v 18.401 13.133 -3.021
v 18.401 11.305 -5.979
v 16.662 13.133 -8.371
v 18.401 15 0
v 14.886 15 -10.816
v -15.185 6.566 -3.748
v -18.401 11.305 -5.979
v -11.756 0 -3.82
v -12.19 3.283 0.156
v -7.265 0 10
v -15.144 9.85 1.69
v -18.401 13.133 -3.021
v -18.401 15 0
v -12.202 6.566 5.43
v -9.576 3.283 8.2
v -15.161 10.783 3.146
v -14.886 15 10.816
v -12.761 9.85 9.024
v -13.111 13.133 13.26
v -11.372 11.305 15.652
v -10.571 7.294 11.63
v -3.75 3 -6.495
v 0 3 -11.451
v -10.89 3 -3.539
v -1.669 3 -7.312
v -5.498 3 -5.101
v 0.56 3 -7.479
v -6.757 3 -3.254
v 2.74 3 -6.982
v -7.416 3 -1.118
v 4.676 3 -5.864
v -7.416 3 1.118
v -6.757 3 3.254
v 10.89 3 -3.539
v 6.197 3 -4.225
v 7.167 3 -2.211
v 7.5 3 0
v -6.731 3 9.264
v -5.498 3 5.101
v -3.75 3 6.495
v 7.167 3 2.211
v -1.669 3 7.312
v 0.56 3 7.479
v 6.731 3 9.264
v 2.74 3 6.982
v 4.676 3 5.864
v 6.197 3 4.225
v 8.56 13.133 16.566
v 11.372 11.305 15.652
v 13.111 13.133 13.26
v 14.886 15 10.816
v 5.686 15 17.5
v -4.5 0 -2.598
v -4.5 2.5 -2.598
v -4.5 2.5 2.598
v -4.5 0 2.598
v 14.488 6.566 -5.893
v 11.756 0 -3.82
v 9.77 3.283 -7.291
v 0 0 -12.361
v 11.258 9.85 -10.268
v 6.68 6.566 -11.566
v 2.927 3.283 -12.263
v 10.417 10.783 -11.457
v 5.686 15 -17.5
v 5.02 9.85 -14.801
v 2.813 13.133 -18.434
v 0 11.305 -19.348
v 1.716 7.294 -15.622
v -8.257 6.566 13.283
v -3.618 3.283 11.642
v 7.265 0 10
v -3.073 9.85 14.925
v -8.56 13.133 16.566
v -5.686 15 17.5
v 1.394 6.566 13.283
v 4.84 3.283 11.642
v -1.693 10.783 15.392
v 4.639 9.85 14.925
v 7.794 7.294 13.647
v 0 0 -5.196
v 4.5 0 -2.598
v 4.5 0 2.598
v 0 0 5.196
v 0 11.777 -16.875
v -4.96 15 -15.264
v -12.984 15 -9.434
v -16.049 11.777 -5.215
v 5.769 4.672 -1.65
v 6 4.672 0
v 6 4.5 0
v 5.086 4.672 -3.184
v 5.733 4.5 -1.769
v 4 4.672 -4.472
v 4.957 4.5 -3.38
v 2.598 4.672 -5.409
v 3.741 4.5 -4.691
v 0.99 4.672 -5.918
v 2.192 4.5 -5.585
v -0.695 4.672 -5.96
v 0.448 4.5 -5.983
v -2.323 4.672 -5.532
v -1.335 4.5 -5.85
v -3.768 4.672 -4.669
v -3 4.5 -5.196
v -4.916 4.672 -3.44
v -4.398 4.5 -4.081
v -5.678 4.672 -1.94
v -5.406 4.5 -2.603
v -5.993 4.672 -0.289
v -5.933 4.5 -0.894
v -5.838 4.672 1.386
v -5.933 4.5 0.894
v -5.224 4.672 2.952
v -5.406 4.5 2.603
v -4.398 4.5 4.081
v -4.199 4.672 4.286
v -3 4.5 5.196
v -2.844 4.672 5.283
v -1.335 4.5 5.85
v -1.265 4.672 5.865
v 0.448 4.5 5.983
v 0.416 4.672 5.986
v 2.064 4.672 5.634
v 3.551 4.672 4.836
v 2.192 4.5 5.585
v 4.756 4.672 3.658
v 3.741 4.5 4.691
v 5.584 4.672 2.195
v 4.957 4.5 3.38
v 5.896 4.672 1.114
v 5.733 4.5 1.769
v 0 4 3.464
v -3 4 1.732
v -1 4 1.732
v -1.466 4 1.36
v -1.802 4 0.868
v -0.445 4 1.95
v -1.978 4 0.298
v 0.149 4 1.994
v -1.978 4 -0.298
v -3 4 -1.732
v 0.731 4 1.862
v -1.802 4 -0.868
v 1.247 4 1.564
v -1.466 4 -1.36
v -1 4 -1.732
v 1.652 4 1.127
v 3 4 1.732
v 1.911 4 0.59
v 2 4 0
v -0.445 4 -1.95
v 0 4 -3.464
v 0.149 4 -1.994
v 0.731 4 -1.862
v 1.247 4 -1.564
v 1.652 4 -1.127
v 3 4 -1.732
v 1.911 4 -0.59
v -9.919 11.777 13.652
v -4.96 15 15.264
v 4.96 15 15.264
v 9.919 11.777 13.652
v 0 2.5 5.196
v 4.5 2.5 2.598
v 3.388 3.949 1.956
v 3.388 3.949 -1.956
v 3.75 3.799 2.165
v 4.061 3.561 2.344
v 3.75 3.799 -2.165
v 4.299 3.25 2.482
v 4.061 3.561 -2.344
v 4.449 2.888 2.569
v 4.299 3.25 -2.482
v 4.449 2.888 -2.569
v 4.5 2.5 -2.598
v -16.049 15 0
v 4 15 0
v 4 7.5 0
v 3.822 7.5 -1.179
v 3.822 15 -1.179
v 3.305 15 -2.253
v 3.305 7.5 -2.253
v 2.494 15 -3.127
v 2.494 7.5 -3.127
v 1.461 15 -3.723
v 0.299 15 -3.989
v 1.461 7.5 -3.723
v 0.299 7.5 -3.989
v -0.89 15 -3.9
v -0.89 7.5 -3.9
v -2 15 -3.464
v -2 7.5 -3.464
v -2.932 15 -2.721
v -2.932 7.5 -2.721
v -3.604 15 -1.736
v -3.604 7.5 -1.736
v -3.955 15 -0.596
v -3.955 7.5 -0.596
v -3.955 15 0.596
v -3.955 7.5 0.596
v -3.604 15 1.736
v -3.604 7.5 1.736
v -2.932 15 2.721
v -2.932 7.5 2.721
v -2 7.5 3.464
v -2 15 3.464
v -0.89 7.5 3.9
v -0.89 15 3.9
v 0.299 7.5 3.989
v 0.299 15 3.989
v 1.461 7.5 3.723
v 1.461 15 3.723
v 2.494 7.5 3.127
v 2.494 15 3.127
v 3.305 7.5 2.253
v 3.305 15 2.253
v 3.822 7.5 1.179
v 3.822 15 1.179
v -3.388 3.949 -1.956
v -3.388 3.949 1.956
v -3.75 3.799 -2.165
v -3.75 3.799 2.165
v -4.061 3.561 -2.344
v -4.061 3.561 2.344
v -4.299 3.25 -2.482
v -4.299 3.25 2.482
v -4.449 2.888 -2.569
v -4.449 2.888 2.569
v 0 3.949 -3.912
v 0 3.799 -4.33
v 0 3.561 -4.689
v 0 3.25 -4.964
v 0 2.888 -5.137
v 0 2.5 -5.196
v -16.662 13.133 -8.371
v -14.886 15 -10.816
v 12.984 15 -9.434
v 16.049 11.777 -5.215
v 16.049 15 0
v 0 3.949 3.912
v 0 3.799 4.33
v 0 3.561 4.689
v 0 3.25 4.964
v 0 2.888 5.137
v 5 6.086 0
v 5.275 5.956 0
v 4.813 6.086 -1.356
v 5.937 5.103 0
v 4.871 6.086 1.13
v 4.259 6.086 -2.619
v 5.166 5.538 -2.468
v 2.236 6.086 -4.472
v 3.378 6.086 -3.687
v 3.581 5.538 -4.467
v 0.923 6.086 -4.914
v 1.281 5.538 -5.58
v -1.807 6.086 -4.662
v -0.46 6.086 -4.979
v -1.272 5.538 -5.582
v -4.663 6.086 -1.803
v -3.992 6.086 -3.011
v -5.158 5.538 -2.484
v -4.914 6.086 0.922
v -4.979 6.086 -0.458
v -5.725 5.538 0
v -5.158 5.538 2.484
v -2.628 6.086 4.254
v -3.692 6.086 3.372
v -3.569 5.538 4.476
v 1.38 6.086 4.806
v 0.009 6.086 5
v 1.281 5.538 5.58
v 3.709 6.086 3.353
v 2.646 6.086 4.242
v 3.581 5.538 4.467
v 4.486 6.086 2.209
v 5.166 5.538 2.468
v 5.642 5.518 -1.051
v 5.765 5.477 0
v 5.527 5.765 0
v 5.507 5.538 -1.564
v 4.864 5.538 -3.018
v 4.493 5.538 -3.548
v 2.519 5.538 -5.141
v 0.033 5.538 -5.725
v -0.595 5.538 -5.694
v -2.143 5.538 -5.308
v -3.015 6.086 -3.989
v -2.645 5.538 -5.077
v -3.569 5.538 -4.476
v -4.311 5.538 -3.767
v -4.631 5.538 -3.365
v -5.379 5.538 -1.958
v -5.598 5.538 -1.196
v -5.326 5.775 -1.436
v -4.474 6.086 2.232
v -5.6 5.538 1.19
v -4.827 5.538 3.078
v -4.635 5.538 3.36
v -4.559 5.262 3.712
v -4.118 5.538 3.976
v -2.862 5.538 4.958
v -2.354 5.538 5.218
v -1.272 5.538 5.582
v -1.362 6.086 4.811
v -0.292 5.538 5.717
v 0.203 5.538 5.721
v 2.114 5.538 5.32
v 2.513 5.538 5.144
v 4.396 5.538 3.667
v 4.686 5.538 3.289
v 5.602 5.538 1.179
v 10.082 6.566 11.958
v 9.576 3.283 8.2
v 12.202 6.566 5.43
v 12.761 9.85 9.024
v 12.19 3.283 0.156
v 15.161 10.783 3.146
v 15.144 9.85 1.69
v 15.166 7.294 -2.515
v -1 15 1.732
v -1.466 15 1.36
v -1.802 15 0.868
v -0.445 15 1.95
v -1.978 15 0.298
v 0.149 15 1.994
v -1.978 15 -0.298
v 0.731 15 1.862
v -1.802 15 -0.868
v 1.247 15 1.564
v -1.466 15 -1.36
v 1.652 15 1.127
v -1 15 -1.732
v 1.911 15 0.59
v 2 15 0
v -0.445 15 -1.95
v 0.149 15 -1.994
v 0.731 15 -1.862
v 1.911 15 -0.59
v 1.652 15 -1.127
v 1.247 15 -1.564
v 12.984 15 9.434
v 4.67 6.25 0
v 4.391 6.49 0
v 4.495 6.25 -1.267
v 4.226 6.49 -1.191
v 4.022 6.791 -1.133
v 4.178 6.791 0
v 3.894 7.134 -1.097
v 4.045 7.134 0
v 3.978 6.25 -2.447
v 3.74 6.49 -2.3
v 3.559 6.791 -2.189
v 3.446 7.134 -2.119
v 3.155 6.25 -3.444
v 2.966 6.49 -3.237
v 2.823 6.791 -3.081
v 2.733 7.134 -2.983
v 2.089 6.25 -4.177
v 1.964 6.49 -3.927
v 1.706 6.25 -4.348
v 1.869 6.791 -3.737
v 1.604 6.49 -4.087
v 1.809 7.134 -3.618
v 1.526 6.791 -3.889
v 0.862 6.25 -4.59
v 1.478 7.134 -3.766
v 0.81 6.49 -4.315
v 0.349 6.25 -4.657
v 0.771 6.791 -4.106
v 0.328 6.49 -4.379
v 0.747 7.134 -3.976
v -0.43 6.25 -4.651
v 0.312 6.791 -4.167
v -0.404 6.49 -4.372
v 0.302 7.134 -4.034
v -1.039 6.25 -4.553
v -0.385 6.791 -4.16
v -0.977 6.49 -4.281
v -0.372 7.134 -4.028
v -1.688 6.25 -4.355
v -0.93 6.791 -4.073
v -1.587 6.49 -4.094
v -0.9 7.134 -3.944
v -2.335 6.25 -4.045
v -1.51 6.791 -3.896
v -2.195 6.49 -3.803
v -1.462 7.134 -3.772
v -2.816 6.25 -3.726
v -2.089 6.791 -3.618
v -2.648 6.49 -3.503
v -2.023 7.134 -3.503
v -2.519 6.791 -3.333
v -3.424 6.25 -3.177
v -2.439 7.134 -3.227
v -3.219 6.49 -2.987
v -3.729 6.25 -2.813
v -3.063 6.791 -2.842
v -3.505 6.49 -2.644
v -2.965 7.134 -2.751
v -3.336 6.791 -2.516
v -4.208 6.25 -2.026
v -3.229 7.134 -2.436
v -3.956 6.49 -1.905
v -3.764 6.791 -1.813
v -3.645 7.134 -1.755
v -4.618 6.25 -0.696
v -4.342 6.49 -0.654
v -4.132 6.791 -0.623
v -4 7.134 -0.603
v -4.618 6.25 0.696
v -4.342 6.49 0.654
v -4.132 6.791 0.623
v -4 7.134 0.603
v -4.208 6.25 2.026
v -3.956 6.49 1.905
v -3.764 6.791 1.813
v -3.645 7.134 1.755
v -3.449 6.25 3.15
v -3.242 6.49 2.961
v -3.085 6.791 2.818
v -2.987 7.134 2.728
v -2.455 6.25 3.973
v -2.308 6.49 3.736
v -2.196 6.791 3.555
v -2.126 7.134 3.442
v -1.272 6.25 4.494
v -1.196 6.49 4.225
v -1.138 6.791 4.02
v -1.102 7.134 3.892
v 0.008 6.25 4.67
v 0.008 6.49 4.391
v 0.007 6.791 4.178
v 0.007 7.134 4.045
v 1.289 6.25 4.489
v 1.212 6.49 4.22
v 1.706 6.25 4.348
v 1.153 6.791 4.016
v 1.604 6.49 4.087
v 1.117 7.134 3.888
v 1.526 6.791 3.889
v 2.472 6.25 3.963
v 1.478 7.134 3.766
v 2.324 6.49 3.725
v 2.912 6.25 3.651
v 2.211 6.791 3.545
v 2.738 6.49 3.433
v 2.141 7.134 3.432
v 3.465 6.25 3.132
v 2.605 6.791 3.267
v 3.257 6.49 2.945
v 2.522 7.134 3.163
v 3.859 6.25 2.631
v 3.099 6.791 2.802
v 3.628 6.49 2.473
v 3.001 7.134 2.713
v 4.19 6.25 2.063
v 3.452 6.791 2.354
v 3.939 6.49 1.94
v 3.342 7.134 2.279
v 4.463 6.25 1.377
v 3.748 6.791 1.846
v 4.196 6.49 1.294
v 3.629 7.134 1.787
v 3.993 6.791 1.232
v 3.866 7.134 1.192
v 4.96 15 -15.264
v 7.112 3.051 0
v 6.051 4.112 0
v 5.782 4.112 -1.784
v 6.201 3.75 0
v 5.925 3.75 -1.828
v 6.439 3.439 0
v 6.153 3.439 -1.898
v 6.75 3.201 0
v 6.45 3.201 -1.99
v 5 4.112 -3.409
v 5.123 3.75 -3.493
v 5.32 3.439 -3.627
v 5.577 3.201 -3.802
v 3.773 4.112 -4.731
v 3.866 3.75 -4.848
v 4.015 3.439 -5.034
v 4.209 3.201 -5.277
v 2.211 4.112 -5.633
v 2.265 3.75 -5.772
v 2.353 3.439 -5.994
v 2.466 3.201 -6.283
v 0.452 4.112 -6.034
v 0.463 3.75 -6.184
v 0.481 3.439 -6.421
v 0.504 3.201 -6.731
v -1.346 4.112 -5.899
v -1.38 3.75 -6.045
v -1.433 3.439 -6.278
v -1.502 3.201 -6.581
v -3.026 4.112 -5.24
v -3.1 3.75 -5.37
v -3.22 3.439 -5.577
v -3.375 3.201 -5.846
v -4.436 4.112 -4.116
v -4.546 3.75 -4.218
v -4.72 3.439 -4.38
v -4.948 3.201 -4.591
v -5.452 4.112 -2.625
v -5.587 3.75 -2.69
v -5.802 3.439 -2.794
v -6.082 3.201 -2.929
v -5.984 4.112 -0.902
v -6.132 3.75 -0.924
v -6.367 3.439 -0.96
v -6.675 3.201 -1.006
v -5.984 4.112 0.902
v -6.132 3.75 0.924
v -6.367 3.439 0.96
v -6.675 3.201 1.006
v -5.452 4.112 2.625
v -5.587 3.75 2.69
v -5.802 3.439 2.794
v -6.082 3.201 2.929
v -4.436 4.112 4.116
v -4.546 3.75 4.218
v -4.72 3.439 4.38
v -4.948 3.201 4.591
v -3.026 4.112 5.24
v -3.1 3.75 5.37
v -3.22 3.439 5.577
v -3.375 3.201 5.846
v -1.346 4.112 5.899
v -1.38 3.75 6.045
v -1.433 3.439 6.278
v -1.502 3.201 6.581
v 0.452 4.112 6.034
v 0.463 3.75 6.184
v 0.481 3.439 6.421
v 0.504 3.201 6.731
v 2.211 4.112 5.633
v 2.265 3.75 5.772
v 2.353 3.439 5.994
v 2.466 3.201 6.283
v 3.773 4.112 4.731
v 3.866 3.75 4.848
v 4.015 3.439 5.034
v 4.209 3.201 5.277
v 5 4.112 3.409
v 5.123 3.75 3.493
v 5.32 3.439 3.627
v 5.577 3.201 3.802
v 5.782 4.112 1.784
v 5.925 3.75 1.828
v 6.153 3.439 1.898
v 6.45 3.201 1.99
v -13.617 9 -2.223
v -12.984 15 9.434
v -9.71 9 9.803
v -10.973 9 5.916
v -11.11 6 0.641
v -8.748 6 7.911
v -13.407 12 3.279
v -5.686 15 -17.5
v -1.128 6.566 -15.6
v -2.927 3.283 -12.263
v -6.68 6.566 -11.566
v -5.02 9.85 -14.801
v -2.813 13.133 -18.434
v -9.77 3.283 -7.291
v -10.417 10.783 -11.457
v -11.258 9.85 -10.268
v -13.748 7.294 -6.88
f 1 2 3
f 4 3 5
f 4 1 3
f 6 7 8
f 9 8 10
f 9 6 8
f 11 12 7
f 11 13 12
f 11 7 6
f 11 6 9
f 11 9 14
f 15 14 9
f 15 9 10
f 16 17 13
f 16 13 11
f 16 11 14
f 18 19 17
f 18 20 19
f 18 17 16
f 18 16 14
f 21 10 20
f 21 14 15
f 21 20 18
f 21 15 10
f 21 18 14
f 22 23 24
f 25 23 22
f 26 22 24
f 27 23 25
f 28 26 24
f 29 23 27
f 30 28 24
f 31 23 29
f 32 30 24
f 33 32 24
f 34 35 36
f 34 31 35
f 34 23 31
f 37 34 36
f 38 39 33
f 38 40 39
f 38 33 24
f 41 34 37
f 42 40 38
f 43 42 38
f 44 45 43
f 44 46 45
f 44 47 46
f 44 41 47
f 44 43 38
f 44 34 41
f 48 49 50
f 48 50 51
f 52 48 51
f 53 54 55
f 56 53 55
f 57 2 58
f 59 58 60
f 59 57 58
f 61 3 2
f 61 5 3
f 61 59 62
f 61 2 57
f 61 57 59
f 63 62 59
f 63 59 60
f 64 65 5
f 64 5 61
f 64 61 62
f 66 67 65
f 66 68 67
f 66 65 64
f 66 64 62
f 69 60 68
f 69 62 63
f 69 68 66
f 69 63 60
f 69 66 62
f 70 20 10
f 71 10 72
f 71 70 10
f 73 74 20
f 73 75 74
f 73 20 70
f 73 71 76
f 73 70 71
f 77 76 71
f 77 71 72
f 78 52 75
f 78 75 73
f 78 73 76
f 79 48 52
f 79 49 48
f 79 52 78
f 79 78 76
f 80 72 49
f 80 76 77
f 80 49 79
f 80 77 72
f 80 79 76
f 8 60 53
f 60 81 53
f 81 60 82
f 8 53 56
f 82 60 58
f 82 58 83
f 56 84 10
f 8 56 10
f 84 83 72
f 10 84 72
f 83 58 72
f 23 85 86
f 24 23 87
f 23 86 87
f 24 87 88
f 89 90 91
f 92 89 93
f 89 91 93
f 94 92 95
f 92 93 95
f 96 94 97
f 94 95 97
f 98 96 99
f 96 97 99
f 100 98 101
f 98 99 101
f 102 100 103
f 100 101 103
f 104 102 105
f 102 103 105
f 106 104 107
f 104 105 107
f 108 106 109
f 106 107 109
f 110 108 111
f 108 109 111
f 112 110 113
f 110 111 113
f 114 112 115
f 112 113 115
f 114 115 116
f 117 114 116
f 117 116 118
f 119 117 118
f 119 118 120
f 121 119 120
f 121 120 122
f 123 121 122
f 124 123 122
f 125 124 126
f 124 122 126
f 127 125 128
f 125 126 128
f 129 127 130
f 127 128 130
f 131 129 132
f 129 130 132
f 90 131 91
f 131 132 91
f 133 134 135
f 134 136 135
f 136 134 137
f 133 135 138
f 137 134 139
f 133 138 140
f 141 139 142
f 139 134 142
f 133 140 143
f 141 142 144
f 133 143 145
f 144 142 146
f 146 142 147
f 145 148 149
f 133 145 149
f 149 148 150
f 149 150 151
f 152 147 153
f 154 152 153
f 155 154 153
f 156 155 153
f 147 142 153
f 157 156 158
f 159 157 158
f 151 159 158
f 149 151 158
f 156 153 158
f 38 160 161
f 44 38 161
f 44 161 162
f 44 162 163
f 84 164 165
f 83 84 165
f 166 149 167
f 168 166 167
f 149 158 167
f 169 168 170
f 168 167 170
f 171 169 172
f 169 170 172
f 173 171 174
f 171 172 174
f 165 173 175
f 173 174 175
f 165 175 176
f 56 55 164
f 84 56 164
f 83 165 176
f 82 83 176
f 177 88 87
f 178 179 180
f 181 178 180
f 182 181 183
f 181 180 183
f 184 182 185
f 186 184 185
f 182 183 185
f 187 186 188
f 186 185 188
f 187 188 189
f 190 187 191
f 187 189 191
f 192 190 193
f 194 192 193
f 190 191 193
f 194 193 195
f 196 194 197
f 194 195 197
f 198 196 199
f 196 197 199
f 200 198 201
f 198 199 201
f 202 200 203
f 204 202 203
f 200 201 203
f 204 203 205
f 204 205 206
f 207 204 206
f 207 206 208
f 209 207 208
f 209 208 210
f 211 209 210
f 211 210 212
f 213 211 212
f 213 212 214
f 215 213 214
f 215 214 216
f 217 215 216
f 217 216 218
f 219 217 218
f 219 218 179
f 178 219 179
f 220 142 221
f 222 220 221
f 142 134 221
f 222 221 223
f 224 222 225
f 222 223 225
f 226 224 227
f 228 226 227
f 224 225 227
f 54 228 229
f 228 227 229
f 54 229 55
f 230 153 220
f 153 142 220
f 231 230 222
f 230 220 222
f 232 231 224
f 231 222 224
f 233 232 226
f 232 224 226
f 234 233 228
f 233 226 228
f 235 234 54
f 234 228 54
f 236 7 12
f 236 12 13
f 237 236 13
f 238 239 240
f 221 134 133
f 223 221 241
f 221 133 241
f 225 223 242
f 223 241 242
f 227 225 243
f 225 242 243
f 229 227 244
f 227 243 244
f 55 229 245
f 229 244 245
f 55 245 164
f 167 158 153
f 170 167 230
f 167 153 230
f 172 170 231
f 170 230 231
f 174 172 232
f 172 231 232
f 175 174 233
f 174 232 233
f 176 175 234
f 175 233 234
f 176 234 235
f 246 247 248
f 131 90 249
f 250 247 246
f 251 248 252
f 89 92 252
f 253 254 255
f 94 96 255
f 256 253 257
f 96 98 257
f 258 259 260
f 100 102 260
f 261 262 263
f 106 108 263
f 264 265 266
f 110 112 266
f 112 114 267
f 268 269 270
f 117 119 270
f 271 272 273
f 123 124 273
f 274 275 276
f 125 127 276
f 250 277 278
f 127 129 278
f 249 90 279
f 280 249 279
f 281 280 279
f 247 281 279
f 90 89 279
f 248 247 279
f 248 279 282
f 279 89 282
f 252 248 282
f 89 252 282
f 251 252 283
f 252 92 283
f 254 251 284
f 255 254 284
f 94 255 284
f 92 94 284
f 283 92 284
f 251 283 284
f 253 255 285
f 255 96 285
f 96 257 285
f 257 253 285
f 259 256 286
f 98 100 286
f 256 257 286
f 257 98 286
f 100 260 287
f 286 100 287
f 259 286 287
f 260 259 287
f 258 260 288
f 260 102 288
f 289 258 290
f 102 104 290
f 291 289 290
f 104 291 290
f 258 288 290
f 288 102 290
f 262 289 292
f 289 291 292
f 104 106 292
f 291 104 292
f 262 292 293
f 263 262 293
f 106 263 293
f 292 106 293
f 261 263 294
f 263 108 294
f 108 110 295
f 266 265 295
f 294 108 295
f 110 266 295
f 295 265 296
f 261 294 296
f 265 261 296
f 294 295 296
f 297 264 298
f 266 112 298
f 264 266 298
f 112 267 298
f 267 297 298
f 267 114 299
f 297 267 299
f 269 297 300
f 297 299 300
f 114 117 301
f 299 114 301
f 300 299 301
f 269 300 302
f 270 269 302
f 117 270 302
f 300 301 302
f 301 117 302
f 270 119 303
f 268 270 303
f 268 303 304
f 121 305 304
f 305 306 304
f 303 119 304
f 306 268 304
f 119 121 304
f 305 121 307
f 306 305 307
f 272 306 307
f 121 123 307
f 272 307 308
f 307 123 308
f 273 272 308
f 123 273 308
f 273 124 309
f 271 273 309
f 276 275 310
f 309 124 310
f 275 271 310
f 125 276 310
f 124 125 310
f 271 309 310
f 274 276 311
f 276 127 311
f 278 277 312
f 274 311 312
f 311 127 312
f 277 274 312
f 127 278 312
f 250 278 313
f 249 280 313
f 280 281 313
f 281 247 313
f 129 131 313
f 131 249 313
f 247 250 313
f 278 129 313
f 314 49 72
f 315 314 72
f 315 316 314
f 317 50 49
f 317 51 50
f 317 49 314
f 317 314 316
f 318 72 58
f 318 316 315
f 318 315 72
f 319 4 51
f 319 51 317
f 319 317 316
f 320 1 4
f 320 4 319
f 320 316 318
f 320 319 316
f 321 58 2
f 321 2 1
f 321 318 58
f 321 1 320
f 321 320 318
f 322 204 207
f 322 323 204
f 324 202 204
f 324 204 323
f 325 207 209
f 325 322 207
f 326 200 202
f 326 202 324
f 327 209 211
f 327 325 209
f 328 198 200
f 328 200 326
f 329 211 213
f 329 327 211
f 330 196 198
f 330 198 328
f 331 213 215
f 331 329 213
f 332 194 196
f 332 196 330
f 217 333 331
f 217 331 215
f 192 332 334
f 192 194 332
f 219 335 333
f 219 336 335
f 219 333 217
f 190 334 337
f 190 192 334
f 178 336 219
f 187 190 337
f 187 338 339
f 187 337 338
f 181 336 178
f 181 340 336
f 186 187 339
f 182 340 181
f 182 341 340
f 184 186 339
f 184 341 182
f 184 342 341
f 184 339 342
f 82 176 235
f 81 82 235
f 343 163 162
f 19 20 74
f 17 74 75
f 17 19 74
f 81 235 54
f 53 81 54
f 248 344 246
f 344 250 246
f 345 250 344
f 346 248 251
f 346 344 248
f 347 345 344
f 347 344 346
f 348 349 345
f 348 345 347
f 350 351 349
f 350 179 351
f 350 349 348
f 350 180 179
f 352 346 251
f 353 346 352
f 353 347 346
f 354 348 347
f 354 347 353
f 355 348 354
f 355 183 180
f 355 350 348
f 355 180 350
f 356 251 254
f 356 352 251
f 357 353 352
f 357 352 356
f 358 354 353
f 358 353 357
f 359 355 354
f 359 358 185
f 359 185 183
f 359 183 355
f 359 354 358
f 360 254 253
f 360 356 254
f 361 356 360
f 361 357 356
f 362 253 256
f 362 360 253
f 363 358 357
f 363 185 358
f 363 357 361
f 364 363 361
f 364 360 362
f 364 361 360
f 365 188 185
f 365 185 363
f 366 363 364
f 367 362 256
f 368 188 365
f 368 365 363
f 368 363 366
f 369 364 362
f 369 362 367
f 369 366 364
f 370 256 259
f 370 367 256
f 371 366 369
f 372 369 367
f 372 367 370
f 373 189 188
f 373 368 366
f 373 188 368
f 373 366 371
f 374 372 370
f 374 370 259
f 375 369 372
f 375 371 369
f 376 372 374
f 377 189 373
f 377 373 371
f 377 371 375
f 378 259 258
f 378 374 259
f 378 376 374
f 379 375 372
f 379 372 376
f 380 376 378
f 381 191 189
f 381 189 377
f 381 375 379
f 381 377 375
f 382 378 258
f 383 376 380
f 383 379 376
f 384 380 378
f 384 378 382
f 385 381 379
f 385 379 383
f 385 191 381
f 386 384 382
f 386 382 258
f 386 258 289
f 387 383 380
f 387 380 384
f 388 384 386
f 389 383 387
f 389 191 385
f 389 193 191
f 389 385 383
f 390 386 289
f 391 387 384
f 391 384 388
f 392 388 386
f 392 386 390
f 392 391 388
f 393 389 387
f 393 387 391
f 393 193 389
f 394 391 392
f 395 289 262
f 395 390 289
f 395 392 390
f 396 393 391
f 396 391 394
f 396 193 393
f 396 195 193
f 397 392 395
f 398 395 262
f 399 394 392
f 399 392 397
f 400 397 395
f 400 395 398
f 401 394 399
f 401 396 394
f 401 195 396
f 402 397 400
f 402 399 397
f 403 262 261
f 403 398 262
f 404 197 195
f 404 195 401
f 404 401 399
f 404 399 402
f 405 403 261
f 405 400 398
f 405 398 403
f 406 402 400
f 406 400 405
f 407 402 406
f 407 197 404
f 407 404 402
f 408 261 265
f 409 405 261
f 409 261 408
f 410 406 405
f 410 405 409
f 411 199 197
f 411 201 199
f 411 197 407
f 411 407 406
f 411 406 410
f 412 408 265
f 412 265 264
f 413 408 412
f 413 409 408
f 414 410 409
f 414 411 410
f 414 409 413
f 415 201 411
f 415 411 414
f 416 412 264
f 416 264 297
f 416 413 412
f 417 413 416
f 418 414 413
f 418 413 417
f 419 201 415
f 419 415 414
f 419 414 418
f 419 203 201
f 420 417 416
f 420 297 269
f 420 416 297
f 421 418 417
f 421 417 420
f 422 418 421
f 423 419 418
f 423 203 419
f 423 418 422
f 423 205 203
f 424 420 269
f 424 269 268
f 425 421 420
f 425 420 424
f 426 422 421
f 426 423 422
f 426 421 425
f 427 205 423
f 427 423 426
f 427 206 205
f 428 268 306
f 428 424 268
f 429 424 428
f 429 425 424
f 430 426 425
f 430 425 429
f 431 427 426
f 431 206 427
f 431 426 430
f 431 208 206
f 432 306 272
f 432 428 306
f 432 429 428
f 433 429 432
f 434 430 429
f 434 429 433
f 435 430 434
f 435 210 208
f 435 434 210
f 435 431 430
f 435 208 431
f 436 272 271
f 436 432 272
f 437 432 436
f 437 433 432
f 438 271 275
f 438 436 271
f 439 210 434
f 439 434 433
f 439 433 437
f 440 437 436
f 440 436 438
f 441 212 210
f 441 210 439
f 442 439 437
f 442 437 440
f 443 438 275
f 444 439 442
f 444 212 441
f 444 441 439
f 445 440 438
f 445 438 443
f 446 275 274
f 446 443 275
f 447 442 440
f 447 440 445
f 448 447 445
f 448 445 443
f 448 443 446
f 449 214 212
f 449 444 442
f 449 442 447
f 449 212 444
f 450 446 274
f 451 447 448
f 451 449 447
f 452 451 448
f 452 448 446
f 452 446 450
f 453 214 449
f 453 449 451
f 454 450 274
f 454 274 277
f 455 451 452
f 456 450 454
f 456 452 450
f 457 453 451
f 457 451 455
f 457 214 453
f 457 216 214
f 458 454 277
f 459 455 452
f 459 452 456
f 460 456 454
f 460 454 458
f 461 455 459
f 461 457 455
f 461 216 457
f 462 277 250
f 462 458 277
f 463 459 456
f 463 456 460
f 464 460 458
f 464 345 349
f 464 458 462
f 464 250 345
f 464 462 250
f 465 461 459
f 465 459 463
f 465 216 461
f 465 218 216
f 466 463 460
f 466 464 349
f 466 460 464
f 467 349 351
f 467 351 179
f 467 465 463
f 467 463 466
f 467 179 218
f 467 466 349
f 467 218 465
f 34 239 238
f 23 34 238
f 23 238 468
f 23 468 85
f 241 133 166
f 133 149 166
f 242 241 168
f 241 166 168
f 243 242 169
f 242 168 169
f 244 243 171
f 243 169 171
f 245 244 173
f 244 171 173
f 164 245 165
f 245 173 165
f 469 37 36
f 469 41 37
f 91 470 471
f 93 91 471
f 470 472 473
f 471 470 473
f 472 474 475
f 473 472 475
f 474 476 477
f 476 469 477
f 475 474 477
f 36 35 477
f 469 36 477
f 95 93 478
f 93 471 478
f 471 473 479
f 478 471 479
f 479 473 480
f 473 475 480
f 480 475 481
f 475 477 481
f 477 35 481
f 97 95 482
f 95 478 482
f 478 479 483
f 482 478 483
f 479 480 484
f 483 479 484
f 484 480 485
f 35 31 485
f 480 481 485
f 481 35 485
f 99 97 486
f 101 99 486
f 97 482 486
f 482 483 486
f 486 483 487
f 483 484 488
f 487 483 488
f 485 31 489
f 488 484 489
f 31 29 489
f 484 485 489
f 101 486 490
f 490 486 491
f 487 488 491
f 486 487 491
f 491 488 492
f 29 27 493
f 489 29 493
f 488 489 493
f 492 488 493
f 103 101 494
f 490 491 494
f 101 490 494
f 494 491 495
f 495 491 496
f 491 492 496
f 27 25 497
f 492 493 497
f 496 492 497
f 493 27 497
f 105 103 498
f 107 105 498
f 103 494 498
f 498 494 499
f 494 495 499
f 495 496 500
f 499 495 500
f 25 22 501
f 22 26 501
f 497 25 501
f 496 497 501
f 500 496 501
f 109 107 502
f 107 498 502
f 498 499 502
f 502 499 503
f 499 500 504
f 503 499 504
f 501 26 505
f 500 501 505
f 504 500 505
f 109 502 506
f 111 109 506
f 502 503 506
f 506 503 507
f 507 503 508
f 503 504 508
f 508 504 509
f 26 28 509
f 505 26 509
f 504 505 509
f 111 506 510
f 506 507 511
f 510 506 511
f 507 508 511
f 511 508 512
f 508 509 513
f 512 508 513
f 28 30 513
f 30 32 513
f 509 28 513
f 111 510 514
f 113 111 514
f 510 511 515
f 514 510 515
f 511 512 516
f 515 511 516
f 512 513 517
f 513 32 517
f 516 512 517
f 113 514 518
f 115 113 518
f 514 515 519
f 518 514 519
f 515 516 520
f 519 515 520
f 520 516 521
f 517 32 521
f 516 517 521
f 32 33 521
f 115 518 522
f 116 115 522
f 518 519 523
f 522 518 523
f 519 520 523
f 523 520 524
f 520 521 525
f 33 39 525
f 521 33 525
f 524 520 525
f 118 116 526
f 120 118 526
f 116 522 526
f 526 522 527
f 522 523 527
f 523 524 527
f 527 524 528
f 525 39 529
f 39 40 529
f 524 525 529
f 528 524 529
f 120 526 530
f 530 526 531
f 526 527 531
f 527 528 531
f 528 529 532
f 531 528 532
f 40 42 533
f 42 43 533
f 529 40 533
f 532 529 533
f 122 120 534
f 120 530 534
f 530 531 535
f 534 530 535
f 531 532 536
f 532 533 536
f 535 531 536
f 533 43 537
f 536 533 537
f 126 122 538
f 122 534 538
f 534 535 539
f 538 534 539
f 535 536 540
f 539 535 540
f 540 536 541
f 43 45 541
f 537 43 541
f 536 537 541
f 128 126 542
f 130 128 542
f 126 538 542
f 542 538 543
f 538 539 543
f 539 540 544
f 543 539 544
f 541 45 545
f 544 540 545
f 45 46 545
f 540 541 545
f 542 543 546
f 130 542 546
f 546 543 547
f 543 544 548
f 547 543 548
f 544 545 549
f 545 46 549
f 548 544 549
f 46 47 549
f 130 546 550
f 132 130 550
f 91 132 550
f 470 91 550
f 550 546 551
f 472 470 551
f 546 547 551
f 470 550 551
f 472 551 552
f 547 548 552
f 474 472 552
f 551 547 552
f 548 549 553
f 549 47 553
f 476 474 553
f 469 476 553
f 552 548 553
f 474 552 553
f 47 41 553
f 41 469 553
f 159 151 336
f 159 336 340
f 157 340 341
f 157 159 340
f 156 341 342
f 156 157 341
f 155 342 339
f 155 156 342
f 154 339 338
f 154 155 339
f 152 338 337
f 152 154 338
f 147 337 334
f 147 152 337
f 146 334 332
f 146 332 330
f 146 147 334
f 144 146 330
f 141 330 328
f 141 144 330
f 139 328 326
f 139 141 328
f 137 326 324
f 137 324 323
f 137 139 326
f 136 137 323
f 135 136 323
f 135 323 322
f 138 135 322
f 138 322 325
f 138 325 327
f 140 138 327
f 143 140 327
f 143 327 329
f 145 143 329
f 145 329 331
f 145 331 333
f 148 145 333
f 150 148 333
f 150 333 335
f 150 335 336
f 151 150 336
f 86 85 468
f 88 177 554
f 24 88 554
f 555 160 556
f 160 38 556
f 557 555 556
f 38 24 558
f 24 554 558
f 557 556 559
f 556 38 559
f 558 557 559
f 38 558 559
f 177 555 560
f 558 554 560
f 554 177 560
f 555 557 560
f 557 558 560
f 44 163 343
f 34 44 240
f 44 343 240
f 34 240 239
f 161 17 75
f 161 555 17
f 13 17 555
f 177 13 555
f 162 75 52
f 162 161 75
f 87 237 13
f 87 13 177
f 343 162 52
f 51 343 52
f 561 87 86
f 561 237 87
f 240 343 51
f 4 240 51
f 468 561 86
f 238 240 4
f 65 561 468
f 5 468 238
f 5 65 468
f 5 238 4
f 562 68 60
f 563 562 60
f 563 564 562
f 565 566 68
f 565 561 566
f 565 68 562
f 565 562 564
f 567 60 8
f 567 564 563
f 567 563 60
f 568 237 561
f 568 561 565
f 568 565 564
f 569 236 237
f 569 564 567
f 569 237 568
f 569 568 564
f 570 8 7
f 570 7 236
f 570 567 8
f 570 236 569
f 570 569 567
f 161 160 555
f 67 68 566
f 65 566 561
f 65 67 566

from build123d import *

# Parameters (mm, degrees)
BOSS_EXTRUDE1_DEPTH     = 30
BOSS_EXTRUDE1_TAPER     = -26.56505118
SKETCH3_OUTSIDE_W       = 108.076
SKETCH3_OUTSIDE_H       = 105.2
CUT_EXTRUDE1_DEPTH      = 30
CUT_EXTRUDE1_TAPER      = 26.56505118
SKETCH5_R               = 19.347524159
CUT_EXTRUDE2_DEPTH      = 25
SHELL1_T                = -2
SKETCH6_R               = 4
SKETCH6_R_2             = 2
BOSS_EXTRUDE2_DEPTH     = 13
SKETCH10_R              = 6
SKETCH10_R_2            = 4
BOSS_EXTRUDE4_DEPTH     = 3
FILLET5_R               = 1.5
CUT_EXTRUDE3_START      = -1
CUT_EXTRUDE3_DEPTH      = 2
CUT_EXTRUDE3_DEPTH_BACK = 2
FILLET6_R               = 1.5


with BuildPart() as part:
    # Sketch1 → Boss-Extrude1 (new body)
    with BuildSketch(Plane(origin=(0, 0, 0), x_dir=(1, 0, 0), z_dir=(0, 1, 0))):
        Polygon((0, 12.360679775), (-11.755705046, 3.819660113), (-7.26542528, -10), (7.26542528, -10), (11.755705046, 3.819660113), align=None)
    extrude(amount=BOSS_EXTRUDE1_DEPTH, taper=BOSS_EXTRUDE1_TAPER)

    # Sketch3 outside → Cut-Extrude1 (cut)
    with BuildSketch(Plane(origin=(0, 30, 0), x_dir=(1, 0, 0), z_dir=(0, 1, 0))):
        with Locations((0, 2.951)):
            Rectangle(SKETCH3_OUTSIDE_W, SKETCH3_OUTSIDE_H)
        Polygon((7.26542528, 10), (-7.26542528, 10), (-11.755705046, -3.819660113), (0, -12.360679775), (11.755705046, -3.819660113), align=None, mode=Mode.SUBTRACT)
    extrude(amount=-CUT_EXTRUDE1_DEPTH, taper=CUT_EXTRUDE1_TAPER, mode=Mode.SUBTRACT)

    # Sketch5 → Cut-Extrude2 (cut)
    with BuildSketch(Plane(origin=(0, 15, 0), x_dir=(1, 0, 0), z_dir=(0, 1, 0))):
        Circle(SKETCH5_R)
    extrude(amount=CUT_EXTRUDE2_DEPTH, mode=Mode.SUBTRACT)

    # Shell1
    shell1_openings = [part.faces().sort_by_distance(p)[0] for p in [
        (0, 15, 0),
    ]]
    offset(amount=SHELL1_T, openings=shell1_openings, kind=Kind.INTERSECTION)

    # Sketch6 → Boss-Extrude2 (add)
    with BuildSketch(Plane(origin=(0, 2, 0), x_dir=(1, 0, 0), z_dir=(0, 1, 0))):
        Circle(SKETCH6_R)
        Circle(SKETCH6_R_2, mode=Mode.SUBTRACT)
    extrude(amount=BOSS_EXTRUDE2_DEPTH)

    # Sketch12 → Loft1 section 0
    with BuildSketch(Plane(origin=(0, 3, 0), x_dir=(1, 0, 0), z_dir=(0, 1, 0))):
        Polygon((0, 11.450849719), (-10.890405242, 3.538507163), (-6.730640591, -9.263932023), (6.730640591, -9.263932023), (10.890405242, 3.538507163), align=None)
    # Sketch13 → Loft1 section 1
    with BuildSketch(Plane(origin=(0, 2, 0), x_dir=(1, 0, 0), z_dir=(0, 1, 0))):
        Polygon((10.30261999, 3.347524158), (0, 10.83281573), (-10.30261999, 3.347524158), (-6.367369327, -8.763932023), (6.367369327, -8.763932023), align=None)
    loft()

    # Sketch10 → Boss-Extrude4 (add)
    with BuildSketch(Plane(origin=(0, 3, 0), x_dir=(1, 0, 0), z_dir=(0, 1, 0))):
        Circle(SKETCH10_R)
        Circle(SKETCH10_R_2, mode=Mode.SUBTRACT)
    extrude(amount=BOSS_EXTRUDE4_DEPTH)

    # Fillet5
    fillet5_edges = [part.edges().sort_by_distance(p)[0] for p in [
        (-6, 3, 0),
        (-4, 6, 0),
    ]]
    fillet(fillet5_edges, radius=FILLET5_R)

    # Sketch10<3> → Cut-Extrude3 (cut, two sides)
    with BuildSketch(Plane(origin=(0, 3, 0), x_dir=(1, 0, 0), z_dir=(0, 1, 0)).offset(CUT_EXTRUDE3_START)) as cut_extrude3_sk:
        Polygon((0, 5.196152423), (-4.5, 2.598076211), (-4.5, -2.598076211), (0, -5.196152423), (4.5, -2.598076211), (4.5, 2.598076211), align=None)
    extrude(amount=CUT_EXTRUDE3_DEPTH, mode=Mode.SUBTRACT)
    extrude(cut_extrude3_sk.sketch, amount=-CUT_EXTRUDE3_DEPTH_BACK, mode=Mode.SUBTRACT)

    # Fillet6
    fillet6_edges = [part.edges().sort_by_distance(p)[0] for p in [
        (-6, 6, 0),
        (4.5, 4, 0),
        (2.25, 4, 3.897114317),
        (-2.25, 4, 3.897114317),
        (-4.5, 4, 0),
        (-2.25, 4, -3.897114317),
        (2.25, 4, -3.897114317),
    ]]
    fillet(fillet6_edges, radius=FILLET6_R)


solid = part.part
